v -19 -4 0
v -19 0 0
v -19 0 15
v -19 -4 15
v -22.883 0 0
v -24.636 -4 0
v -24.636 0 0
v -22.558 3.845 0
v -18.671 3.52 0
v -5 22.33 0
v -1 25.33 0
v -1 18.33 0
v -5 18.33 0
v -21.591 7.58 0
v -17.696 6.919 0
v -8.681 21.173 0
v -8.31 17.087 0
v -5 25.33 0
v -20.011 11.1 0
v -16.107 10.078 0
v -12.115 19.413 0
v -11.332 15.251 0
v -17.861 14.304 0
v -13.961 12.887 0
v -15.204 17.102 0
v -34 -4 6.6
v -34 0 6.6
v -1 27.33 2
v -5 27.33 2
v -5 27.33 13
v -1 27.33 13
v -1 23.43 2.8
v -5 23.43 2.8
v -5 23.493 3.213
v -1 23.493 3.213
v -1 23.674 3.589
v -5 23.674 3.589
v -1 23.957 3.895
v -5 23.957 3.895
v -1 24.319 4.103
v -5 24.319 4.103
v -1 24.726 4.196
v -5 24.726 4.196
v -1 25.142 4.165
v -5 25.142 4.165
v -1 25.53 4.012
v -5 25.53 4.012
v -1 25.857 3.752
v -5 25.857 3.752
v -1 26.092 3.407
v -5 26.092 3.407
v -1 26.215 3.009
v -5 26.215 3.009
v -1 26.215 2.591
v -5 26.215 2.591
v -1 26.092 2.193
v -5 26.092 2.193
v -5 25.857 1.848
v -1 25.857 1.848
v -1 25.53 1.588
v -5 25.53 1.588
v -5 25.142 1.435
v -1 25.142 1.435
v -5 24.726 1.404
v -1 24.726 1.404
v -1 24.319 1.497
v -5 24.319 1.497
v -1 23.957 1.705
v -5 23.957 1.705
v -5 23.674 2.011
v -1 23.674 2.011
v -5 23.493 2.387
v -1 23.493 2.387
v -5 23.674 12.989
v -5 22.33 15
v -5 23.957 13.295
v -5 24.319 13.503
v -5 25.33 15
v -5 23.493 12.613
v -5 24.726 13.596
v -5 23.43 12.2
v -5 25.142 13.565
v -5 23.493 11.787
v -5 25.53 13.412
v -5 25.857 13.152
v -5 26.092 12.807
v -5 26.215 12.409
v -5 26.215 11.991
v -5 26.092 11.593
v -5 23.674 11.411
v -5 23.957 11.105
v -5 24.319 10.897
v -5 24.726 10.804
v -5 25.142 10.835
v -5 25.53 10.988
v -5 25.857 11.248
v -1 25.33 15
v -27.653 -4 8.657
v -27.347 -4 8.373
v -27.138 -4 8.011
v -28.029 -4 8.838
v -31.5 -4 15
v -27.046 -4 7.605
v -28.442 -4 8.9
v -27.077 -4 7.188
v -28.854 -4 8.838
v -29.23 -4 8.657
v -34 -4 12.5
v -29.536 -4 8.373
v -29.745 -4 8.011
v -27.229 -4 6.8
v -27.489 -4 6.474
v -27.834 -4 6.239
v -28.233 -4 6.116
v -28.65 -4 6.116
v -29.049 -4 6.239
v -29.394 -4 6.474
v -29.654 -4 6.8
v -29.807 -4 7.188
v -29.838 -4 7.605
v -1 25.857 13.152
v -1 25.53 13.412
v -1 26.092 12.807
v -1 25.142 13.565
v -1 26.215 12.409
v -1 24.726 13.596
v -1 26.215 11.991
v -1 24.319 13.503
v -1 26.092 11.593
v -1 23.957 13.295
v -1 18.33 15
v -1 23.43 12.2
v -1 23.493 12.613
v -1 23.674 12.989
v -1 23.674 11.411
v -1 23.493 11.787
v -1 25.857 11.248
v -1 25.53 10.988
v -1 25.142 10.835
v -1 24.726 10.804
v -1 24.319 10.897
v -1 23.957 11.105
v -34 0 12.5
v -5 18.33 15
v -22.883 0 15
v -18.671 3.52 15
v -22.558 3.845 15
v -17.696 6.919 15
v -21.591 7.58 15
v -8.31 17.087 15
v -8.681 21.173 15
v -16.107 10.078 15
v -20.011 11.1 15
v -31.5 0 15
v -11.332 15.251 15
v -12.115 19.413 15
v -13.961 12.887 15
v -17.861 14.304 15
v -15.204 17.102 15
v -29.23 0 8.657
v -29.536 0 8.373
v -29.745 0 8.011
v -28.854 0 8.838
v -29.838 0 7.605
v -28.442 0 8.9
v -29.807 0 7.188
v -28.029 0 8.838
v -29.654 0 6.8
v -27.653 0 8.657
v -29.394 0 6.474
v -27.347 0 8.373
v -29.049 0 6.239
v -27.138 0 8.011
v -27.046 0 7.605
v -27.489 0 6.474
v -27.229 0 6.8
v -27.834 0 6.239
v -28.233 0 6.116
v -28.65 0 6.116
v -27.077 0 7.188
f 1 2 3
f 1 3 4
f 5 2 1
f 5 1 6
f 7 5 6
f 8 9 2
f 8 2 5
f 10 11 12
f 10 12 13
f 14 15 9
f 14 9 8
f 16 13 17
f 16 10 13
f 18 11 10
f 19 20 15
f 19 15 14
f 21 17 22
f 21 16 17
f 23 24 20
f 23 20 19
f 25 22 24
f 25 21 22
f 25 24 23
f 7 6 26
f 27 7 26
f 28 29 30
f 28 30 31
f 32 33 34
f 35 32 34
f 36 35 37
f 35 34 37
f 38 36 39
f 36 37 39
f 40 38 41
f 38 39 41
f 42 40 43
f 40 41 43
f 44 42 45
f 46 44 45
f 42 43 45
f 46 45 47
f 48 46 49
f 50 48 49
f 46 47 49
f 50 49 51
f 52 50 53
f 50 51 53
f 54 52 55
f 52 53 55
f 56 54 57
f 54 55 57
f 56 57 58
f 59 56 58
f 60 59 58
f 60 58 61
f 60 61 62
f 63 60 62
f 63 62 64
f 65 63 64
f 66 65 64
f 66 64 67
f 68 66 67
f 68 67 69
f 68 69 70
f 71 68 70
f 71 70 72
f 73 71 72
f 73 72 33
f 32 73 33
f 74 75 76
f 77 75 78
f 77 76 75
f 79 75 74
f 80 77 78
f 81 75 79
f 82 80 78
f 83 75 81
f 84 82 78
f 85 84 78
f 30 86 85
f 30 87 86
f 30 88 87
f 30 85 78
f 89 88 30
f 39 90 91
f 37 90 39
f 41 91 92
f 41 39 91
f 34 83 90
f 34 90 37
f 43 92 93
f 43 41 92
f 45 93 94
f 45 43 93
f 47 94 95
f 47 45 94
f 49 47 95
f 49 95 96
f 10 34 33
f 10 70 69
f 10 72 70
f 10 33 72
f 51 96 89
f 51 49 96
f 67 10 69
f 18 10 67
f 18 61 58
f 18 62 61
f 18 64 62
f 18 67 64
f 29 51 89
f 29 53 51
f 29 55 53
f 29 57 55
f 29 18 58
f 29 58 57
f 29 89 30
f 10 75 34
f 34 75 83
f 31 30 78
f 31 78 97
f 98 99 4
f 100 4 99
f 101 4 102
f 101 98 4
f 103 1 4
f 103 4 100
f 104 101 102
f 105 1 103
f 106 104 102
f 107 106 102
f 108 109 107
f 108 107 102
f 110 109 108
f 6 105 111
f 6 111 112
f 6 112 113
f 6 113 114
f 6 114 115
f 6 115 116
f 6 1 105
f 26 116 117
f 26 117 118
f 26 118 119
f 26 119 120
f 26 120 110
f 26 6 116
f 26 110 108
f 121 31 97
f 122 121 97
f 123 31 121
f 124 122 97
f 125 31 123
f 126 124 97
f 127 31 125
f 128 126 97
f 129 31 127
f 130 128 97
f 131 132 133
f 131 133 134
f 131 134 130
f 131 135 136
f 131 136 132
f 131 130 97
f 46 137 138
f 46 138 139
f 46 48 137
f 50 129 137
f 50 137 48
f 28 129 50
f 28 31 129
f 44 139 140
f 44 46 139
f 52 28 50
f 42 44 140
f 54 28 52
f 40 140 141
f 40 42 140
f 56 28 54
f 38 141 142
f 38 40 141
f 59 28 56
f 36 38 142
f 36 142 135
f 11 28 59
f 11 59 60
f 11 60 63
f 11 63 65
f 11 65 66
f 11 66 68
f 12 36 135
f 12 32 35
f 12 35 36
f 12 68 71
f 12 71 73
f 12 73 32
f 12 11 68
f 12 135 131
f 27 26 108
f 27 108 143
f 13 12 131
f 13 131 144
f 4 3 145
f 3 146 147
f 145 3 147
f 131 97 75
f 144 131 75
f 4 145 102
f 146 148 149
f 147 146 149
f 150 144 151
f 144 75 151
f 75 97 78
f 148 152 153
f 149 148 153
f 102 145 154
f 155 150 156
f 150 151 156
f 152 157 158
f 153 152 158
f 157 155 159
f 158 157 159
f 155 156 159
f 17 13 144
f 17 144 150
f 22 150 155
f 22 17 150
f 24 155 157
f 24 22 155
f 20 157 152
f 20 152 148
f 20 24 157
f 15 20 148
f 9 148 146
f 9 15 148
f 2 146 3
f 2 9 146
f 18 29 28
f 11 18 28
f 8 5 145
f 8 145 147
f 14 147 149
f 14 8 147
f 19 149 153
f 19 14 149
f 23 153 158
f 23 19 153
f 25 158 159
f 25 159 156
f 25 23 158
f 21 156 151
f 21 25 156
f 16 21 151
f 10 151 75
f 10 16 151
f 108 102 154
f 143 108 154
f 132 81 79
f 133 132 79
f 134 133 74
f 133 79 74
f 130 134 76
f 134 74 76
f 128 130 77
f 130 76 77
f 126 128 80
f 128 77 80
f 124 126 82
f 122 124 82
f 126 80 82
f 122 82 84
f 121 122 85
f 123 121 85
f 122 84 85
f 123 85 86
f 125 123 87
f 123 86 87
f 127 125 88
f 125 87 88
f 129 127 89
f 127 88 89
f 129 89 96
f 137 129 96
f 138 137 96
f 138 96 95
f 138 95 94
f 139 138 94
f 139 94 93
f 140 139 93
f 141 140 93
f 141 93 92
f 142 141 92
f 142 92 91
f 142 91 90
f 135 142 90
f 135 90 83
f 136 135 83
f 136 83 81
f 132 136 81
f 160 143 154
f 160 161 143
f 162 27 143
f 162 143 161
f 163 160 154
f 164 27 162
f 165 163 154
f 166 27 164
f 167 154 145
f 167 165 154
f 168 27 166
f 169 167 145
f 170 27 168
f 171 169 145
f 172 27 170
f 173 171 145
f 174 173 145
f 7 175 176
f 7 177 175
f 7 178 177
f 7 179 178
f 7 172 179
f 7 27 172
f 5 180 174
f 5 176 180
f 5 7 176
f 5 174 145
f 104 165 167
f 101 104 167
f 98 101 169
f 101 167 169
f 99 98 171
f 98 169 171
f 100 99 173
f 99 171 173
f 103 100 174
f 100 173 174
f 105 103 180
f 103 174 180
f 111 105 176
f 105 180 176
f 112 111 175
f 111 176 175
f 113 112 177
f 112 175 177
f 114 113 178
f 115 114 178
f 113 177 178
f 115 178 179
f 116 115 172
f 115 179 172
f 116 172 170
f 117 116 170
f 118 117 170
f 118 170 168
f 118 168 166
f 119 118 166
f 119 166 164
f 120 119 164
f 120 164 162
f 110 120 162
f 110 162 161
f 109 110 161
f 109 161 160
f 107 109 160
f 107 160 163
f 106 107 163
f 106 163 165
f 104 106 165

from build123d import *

# Parameters (mm, degrees)
BOSS_EXTRUDE1_DEPTH = 15
CHAMFER1_SIZE       = 2.5
SKETCH2_R           = 1.4
CUT_EXTRUDE1_DEPTH  = 15
CHAMFER2_SIZE       = 2
SKETCH3_R           = 1.4
CUT_EXTRUDE2_DEPTH  = 47.129659115
CUT_EXTRUDE3_DEPTH  = 25


with BuildPart() as part:
    # Sketch1 → Boss-Extrude1 (new body)
    with BuildSketch(Plane.XY):
        with BuildLine():
            Line((-19, 0), (-19, -4))
            Line((-19, -4), (-34, -4))
            Line((-34, -4), (-34, 0))
            Line((-34, 0), (-22.883234523, 0))
            ThreePointArc((-22.883234523, 0), (-17.861391251, 14.304304416), (-5, 22.33030278))
            Line((-5, 22.33030278), (-5, 27.33030278))
            Line((-5, 27.33030278), (-1, 27.33030278))
            Line((-1, 27.33030278), (-1, 18.33030278))
            Line((-1, 18.33030278), (-5, 18.33030278))
            ThreePointArc((-5, 18.33030278), (-15.099668871, 11.532562595), (-19, 0))
        make_face()
    extrude(amount=BOSS_EXTRUDE1_DEPTH)

    # Chamfer1
    chamfer1_edges = [part.edges().sort_by_distance(p)[0] for p in [
        (-34, -2, 0),
        (-34, -2, 15),
    ]]
    chamfer(chamfer1_edges, length=CHAMFER1_SIZE)

    # Sketch2 → Cut-Extrude1 (cut)
    with BuildSketch(Plane.ZY.offset(5)):
        with Locations(Location((2.8, 24.83030278, 0), (0, 0, 270))):
            Circle(SKETCH2_R)
        with Locations(Location((12.2, 24.83030278, 0), (0, 0, 270))):
            Circle(SKETCH2_R)
    extrude(amount=-CUT_EXTRUDE1_DEPTH, mode=Mode.SUBTRACT)

    # Chamfer2
    chamfer2_edges = [part.edges().sort_by_distance(p)[0] for p in [
        (-3, 27.33030278, 0),
        (-3, 27.33030278, 15),
    ]]
    chamfer(chamfer2_edges, length=CHAMFER2_SIZE)

    # Sketch3 → Cut-Extrude2 (cut, through all)
    with BuildSketch(Plane(origin=(0, 0, 0), x_dir=(1, 0, 0), z_dir=(0, 1, 0))):
        with Locations(Location((-28.441617262, -7.5, 0), (0, 0, 270))):
            Circle(SKETCH3_R)
    extrude(amount=-CUT_EXTRUDE2_DEPTH, mode=Mode.SUBTRACT)

    # Sketch4 → Cut-Extrude3 (cut)
    with BuildSketch(Plane.XZ.offset(4)):
        Polygon((-24.636069701, 0), (-34, 6.600391812), (-34, 2.5), (-31.5, 0), align=None)
    extrude(amount=-CUT_EXTRUDE3_DEPTH, mode=Mode.SUBTRACT)


solid = part.part
